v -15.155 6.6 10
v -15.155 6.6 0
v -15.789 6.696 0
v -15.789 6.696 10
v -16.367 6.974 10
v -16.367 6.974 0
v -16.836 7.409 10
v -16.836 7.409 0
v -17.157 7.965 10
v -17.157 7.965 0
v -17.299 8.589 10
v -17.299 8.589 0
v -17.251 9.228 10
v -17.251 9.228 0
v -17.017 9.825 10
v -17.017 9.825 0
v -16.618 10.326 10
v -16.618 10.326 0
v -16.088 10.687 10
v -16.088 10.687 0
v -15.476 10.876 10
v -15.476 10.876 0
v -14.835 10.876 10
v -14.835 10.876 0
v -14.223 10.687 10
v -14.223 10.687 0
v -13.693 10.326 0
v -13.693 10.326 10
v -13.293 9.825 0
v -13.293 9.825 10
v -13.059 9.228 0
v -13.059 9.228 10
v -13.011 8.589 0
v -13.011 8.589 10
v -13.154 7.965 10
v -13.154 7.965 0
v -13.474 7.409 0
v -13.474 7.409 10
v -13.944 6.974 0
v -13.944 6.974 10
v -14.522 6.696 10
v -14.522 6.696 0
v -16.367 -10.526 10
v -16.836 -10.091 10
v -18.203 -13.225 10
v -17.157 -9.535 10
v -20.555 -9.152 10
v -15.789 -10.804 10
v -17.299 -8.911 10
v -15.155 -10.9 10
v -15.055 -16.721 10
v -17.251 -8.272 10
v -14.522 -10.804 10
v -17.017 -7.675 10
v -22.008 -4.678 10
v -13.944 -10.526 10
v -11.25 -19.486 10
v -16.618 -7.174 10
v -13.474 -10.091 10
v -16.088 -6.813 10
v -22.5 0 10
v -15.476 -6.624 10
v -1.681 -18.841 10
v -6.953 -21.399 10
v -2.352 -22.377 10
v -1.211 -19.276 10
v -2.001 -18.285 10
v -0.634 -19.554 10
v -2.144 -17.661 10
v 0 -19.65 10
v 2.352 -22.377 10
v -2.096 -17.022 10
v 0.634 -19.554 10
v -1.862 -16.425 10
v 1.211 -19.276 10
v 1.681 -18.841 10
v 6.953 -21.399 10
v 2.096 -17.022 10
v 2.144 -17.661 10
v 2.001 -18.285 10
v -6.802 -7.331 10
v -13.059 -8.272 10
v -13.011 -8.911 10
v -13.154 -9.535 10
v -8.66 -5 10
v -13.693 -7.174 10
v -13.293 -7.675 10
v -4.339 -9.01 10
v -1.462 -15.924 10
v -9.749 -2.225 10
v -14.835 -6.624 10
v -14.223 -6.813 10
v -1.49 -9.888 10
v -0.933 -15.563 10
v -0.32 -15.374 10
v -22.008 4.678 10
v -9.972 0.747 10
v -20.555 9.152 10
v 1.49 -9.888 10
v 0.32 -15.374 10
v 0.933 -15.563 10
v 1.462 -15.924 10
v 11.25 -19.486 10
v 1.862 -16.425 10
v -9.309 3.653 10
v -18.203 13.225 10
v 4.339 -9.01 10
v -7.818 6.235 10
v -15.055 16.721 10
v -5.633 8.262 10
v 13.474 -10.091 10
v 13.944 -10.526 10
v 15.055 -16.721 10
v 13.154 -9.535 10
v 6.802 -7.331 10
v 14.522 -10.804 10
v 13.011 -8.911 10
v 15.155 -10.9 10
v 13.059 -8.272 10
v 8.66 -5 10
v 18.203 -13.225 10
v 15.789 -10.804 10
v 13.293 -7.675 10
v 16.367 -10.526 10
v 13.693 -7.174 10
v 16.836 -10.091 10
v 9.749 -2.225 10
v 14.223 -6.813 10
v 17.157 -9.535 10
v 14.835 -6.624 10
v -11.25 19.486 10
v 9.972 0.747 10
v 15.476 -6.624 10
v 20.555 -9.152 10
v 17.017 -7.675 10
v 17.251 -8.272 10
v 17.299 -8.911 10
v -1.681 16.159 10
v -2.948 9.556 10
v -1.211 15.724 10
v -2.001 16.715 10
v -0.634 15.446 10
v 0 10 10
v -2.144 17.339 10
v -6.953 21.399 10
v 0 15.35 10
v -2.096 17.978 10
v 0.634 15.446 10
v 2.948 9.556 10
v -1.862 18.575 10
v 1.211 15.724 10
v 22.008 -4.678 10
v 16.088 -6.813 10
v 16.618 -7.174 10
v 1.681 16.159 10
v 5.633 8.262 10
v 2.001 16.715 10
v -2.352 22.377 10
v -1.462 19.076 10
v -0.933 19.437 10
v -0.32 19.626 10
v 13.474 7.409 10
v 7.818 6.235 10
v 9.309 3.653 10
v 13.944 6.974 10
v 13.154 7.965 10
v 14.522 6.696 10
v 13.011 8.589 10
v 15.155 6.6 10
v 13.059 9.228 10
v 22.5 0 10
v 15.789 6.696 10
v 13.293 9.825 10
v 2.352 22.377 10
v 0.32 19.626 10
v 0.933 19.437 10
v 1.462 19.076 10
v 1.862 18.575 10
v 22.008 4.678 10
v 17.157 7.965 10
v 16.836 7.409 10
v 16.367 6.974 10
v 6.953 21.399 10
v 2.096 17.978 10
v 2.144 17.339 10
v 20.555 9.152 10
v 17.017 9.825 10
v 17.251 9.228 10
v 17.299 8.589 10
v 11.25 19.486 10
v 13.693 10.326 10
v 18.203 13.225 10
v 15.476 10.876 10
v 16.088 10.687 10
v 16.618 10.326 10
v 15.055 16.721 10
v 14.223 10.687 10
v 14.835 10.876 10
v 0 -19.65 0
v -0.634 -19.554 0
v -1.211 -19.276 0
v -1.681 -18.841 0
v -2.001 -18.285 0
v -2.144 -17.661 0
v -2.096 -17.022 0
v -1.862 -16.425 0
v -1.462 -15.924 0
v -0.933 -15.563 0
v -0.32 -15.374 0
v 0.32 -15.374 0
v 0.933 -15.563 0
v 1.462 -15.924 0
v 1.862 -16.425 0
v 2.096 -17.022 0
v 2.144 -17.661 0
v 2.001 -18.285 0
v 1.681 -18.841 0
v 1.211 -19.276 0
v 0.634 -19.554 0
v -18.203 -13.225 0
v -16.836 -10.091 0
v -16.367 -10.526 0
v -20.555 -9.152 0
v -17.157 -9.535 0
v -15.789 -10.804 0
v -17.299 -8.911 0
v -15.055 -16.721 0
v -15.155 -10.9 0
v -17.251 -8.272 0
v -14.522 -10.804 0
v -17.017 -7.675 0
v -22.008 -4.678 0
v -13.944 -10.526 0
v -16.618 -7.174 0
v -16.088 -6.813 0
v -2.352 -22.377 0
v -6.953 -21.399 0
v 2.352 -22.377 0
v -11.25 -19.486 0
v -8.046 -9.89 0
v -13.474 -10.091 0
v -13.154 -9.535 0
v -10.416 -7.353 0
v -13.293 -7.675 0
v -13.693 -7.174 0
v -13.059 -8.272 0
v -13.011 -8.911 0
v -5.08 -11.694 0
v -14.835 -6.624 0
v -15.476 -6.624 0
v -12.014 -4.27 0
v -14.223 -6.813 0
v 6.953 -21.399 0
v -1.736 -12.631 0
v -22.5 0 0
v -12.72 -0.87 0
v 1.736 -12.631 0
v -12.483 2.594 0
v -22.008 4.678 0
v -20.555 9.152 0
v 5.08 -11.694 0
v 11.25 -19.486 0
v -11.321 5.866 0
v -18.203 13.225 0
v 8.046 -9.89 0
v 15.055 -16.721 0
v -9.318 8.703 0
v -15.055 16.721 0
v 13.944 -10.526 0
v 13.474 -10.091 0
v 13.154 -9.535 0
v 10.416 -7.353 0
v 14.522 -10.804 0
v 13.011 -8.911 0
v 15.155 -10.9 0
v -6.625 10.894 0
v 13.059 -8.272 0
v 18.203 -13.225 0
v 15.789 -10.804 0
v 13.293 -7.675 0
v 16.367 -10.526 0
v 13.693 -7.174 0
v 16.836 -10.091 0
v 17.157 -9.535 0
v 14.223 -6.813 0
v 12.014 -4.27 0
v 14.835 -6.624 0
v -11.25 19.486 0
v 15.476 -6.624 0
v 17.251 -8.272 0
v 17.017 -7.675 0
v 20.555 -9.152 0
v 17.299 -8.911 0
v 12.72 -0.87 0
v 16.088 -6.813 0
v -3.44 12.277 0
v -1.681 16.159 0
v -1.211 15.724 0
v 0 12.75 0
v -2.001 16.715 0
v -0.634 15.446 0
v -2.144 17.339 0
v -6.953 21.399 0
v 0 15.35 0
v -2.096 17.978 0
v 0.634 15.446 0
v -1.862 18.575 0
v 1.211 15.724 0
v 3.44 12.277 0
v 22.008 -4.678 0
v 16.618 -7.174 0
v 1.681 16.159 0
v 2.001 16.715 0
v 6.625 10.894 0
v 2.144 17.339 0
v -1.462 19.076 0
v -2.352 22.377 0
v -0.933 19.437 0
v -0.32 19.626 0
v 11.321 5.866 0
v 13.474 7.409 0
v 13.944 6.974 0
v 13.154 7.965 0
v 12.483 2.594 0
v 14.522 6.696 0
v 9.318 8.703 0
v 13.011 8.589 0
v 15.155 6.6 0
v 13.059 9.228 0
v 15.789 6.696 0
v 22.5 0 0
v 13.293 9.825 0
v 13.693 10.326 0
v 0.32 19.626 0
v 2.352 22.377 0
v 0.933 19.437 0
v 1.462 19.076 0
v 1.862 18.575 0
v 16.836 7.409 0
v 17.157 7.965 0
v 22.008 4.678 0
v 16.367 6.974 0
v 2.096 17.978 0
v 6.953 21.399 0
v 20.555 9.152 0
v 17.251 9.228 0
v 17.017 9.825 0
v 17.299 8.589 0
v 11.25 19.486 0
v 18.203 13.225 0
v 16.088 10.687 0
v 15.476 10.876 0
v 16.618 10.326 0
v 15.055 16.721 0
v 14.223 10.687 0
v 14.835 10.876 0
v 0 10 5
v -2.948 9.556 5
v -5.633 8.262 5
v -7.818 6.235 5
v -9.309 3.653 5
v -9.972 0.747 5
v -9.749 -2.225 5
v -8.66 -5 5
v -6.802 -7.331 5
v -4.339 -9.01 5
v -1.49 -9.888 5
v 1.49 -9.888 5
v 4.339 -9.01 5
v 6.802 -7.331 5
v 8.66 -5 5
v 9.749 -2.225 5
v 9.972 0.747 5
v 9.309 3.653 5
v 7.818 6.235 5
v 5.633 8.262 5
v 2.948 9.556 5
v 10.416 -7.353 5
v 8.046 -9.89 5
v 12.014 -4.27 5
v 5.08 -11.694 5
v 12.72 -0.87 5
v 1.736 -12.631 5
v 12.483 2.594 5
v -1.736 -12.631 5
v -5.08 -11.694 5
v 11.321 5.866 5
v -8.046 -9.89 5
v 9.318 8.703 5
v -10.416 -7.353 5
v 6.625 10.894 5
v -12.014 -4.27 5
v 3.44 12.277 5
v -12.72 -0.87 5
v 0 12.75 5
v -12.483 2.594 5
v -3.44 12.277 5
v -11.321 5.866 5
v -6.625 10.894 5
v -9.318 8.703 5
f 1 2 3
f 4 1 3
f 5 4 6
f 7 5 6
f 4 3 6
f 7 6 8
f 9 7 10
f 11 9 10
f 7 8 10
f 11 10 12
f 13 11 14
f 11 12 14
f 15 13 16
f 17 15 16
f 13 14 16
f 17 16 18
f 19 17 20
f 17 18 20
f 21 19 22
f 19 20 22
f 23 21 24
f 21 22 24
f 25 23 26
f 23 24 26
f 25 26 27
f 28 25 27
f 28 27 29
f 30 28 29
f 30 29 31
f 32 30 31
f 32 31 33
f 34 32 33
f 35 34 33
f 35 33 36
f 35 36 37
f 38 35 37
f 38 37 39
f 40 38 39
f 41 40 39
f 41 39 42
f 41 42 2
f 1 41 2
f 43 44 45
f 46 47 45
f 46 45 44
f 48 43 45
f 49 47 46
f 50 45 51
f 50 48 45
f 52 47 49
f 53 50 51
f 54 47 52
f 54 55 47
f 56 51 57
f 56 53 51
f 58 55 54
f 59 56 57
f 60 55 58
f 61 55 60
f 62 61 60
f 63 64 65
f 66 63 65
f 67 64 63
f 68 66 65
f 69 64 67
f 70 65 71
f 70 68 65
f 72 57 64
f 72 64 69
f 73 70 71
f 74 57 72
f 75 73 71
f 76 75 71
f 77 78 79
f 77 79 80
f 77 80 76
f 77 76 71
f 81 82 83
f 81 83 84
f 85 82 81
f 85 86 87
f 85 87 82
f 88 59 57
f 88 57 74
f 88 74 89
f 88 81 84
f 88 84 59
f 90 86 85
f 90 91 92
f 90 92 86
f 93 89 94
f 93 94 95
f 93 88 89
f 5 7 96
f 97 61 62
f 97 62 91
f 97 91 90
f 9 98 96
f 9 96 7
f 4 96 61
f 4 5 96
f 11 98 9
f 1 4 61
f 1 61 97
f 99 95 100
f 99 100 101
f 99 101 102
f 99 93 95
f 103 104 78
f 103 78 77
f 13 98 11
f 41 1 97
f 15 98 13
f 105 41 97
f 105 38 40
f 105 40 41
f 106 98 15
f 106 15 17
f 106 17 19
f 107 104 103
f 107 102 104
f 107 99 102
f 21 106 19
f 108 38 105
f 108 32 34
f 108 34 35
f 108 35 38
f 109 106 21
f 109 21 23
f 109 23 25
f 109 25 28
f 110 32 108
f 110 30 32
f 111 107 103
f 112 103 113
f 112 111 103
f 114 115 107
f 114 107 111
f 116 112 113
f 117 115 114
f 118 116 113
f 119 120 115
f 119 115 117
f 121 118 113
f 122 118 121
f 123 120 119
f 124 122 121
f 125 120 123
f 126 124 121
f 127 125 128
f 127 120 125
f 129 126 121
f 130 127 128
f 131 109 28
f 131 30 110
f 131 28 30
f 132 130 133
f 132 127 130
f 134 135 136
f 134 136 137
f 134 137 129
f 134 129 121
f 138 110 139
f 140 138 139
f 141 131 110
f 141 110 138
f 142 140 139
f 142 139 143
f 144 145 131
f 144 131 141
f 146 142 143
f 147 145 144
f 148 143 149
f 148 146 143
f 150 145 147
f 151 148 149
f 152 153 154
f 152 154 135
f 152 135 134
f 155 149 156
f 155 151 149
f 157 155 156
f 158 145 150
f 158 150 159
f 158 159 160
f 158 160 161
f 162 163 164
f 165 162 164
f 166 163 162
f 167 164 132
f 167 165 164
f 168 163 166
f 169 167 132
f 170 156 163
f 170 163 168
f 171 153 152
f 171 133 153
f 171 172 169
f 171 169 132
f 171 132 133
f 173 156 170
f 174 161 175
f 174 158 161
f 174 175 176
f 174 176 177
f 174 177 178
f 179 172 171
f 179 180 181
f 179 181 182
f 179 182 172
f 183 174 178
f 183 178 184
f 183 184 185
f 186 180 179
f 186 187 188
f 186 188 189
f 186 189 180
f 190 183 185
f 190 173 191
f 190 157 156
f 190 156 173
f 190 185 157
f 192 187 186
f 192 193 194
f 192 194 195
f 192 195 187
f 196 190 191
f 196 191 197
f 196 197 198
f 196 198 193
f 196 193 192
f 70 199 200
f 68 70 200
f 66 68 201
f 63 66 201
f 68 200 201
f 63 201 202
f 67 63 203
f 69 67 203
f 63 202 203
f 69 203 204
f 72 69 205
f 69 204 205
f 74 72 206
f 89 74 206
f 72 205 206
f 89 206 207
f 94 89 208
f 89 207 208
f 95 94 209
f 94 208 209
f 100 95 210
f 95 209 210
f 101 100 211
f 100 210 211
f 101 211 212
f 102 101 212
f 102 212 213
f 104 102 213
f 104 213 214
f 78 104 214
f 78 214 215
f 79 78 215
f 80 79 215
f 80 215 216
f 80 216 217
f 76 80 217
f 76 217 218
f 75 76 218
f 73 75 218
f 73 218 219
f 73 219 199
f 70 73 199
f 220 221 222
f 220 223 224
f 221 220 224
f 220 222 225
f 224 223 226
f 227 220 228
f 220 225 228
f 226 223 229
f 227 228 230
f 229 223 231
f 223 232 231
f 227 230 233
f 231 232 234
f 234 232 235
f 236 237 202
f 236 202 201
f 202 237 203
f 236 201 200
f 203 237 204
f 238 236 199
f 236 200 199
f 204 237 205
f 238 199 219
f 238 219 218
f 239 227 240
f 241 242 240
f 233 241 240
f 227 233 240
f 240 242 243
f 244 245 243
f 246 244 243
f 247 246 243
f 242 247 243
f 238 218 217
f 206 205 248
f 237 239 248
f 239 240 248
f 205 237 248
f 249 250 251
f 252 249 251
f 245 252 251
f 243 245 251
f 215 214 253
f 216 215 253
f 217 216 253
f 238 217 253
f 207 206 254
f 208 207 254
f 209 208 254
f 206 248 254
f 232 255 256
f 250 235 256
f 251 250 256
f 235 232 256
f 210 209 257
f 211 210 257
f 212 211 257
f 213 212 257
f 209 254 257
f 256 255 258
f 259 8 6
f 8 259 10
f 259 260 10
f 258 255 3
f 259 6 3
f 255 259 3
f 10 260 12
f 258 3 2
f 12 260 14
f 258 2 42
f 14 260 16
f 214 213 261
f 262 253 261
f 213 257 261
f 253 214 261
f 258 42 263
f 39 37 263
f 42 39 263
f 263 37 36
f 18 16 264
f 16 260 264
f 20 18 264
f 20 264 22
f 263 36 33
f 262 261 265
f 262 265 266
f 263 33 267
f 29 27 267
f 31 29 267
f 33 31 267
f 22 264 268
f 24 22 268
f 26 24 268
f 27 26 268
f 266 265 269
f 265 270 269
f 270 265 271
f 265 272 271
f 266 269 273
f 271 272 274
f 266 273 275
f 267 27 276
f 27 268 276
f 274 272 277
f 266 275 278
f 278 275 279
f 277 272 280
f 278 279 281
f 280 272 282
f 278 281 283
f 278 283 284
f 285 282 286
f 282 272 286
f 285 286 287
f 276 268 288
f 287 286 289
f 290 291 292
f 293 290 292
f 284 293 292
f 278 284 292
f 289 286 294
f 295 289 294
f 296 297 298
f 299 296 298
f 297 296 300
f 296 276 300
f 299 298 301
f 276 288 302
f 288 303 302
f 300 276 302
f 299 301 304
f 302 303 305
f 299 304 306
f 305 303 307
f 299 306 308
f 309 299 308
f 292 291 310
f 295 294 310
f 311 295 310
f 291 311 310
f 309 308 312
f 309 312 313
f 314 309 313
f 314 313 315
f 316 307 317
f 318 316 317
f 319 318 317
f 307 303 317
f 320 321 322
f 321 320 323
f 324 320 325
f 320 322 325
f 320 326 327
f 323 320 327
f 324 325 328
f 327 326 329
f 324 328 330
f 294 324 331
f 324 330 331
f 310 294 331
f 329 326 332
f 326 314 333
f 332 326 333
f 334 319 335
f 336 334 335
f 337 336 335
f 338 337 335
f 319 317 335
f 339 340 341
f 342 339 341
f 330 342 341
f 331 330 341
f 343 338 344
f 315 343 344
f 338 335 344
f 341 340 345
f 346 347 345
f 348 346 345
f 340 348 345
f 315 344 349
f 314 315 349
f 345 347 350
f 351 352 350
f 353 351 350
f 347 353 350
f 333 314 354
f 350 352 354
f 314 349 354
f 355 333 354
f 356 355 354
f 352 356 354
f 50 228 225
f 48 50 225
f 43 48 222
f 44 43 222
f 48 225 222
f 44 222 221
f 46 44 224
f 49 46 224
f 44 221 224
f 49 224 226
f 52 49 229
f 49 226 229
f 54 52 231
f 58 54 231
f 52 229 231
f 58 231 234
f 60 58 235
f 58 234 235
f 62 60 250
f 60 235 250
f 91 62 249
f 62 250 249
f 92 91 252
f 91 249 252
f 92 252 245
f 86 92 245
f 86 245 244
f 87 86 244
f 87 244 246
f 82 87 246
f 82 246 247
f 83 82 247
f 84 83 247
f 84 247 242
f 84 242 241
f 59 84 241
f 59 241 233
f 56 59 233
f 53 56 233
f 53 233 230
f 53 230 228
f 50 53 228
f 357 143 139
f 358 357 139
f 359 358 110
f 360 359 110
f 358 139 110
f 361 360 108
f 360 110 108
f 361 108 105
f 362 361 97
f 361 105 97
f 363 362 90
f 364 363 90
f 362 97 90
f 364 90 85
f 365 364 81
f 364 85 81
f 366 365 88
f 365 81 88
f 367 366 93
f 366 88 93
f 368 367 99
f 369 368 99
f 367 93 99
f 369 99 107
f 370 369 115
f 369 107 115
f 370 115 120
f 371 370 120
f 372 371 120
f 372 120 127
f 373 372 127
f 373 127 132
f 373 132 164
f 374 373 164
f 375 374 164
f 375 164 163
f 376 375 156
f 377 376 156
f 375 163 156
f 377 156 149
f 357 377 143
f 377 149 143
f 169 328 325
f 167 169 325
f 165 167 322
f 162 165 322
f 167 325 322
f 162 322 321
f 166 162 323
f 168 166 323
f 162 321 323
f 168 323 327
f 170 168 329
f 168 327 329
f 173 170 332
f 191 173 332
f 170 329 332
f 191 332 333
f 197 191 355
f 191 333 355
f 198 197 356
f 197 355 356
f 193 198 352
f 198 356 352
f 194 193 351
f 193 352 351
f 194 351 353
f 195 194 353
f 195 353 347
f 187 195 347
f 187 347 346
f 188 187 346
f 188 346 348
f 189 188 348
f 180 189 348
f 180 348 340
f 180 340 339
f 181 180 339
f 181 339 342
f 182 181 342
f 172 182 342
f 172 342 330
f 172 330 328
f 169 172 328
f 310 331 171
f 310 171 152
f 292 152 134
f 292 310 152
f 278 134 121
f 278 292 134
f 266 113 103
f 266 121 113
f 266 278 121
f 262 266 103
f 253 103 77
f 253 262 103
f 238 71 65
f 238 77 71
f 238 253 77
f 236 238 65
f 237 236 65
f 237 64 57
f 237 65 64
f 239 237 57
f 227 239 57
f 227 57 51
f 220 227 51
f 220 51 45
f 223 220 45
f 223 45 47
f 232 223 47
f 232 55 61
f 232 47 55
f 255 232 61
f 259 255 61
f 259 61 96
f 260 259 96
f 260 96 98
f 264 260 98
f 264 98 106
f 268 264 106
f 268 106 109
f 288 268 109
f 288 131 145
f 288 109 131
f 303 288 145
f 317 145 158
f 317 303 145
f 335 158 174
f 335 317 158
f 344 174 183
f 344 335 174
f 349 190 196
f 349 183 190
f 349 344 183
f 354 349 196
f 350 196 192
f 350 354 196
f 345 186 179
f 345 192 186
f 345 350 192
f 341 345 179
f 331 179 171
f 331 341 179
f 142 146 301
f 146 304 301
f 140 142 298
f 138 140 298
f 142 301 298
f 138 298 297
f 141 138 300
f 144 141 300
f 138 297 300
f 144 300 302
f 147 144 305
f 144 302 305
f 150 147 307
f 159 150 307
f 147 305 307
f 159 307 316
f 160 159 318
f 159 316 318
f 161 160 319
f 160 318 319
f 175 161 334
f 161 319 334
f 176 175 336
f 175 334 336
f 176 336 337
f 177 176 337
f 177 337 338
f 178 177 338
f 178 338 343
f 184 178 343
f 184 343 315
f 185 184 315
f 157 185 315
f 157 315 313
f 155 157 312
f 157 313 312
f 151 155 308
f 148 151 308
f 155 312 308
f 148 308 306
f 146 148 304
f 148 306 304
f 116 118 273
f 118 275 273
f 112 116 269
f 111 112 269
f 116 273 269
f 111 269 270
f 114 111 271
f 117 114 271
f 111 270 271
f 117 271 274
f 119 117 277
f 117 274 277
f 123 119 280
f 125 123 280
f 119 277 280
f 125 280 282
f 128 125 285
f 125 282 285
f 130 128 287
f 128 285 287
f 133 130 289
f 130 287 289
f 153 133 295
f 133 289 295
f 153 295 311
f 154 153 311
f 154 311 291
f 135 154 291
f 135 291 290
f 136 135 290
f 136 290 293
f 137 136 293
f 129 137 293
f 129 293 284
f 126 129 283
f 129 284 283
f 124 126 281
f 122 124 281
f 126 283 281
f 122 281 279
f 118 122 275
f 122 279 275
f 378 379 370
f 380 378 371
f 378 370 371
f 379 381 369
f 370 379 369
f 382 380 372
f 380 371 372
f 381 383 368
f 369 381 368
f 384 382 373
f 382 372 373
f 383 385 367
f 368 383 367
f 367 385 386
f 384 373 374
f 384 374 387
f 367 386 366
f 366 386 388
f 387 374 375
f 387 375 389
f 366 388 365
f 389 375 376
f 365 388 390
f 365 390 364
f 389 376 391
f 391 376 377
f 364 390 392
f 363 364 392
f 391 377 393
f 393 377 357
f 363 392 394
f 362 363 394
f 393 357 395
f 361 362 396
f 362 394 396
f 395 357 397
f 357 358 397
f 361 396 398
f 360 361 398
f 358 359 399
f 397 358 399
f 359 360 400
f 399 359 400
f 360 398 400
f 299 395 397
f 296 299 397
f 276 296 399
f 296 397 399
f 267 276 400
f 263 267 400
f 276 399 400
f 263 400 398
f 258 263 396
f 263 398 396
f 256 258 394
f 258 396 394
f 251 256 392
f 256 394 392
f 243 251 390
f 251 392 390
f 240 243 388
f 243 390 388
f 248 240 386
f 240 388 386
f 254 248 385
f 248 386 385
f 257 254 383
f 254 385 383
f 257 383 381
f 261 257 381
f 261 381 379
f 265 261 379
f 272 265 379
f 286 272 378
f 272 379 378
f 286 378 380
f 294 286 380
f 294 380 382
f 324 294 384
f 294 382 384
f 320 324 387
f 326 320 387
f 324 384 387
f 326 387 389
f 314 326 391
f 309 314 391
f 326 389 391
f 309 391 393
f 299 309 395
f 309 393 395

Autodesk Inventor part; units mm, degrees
ref_plane "YZ Plane" through (0, 0, 0) normal (1, 0, 0) x (0, 1, 0)
ref_plane "XZ Plane" through (0, 0, 0) normal (0, 1, 0) x (-1, 0, 0)
ref_plane "XY Plane" through (0, 0, 0) normal (0, 0, 1) x (1, 0, 0)
sketch "Sketch1" plane through (0, 0, 0) normal (0, 0, 1) x (1, 0, 0)
  circle A0 centre (0, 0) radius 22.5
  dimension "d0" = 45
extrude "Extrusion1" add sketch "Sketch1" along normal blind 10
sketch "Sketch4" plane through (0, 0, 10) normal (0, 0, 1) x (1, 0, 0)
  circle A0 centre (0, 0) radius 22.5 projected
  circle A1 centre (0, 0) radius 17.5
  point P0 (0, 17.5)
  point P1 (-15.1554, 8.75)
  point P2 (-15.1554, -8.75)
  point P3 (0, -17.5)
  point P4 (15.1554, -8.75)
  point P5 (15.1554, 8.75)
  dimension "d18" = 35
  dimension "d21" = 360
hole "Hole3" at (0, 17.5, 10) at (-15.1554, 8.75, 10) at (-15.1554, -8.75, 10) at (0, -17.5, 10) at (15.1554, -8.75, 10) at (15.1554, 8.75, 10) direction (0, 0, -1) diameter 4.3 end through all
sketch "Sketch5" plane through (0, 0, 0) normal (0, 0, -1) x (-1, 0, 0)
  circle A0 centre (0, 0) radius 22.5 projected
hole "Hole4" at (0, 0, 0) direction (0, 0, 1) diameter 25.5 depth 5
sketch "Sketch6" plane through (0, 0, 5) normal (0, 0, -1) x (-1, 0, 0)
  circle A0 centre (0, 0) radius 12.75 projected
hole "Hole5" at (0, 0, 5) at (0, 0, 5) direction (0, 0, 1) diameter 20 end through all
properties part number "nylon clamp"
